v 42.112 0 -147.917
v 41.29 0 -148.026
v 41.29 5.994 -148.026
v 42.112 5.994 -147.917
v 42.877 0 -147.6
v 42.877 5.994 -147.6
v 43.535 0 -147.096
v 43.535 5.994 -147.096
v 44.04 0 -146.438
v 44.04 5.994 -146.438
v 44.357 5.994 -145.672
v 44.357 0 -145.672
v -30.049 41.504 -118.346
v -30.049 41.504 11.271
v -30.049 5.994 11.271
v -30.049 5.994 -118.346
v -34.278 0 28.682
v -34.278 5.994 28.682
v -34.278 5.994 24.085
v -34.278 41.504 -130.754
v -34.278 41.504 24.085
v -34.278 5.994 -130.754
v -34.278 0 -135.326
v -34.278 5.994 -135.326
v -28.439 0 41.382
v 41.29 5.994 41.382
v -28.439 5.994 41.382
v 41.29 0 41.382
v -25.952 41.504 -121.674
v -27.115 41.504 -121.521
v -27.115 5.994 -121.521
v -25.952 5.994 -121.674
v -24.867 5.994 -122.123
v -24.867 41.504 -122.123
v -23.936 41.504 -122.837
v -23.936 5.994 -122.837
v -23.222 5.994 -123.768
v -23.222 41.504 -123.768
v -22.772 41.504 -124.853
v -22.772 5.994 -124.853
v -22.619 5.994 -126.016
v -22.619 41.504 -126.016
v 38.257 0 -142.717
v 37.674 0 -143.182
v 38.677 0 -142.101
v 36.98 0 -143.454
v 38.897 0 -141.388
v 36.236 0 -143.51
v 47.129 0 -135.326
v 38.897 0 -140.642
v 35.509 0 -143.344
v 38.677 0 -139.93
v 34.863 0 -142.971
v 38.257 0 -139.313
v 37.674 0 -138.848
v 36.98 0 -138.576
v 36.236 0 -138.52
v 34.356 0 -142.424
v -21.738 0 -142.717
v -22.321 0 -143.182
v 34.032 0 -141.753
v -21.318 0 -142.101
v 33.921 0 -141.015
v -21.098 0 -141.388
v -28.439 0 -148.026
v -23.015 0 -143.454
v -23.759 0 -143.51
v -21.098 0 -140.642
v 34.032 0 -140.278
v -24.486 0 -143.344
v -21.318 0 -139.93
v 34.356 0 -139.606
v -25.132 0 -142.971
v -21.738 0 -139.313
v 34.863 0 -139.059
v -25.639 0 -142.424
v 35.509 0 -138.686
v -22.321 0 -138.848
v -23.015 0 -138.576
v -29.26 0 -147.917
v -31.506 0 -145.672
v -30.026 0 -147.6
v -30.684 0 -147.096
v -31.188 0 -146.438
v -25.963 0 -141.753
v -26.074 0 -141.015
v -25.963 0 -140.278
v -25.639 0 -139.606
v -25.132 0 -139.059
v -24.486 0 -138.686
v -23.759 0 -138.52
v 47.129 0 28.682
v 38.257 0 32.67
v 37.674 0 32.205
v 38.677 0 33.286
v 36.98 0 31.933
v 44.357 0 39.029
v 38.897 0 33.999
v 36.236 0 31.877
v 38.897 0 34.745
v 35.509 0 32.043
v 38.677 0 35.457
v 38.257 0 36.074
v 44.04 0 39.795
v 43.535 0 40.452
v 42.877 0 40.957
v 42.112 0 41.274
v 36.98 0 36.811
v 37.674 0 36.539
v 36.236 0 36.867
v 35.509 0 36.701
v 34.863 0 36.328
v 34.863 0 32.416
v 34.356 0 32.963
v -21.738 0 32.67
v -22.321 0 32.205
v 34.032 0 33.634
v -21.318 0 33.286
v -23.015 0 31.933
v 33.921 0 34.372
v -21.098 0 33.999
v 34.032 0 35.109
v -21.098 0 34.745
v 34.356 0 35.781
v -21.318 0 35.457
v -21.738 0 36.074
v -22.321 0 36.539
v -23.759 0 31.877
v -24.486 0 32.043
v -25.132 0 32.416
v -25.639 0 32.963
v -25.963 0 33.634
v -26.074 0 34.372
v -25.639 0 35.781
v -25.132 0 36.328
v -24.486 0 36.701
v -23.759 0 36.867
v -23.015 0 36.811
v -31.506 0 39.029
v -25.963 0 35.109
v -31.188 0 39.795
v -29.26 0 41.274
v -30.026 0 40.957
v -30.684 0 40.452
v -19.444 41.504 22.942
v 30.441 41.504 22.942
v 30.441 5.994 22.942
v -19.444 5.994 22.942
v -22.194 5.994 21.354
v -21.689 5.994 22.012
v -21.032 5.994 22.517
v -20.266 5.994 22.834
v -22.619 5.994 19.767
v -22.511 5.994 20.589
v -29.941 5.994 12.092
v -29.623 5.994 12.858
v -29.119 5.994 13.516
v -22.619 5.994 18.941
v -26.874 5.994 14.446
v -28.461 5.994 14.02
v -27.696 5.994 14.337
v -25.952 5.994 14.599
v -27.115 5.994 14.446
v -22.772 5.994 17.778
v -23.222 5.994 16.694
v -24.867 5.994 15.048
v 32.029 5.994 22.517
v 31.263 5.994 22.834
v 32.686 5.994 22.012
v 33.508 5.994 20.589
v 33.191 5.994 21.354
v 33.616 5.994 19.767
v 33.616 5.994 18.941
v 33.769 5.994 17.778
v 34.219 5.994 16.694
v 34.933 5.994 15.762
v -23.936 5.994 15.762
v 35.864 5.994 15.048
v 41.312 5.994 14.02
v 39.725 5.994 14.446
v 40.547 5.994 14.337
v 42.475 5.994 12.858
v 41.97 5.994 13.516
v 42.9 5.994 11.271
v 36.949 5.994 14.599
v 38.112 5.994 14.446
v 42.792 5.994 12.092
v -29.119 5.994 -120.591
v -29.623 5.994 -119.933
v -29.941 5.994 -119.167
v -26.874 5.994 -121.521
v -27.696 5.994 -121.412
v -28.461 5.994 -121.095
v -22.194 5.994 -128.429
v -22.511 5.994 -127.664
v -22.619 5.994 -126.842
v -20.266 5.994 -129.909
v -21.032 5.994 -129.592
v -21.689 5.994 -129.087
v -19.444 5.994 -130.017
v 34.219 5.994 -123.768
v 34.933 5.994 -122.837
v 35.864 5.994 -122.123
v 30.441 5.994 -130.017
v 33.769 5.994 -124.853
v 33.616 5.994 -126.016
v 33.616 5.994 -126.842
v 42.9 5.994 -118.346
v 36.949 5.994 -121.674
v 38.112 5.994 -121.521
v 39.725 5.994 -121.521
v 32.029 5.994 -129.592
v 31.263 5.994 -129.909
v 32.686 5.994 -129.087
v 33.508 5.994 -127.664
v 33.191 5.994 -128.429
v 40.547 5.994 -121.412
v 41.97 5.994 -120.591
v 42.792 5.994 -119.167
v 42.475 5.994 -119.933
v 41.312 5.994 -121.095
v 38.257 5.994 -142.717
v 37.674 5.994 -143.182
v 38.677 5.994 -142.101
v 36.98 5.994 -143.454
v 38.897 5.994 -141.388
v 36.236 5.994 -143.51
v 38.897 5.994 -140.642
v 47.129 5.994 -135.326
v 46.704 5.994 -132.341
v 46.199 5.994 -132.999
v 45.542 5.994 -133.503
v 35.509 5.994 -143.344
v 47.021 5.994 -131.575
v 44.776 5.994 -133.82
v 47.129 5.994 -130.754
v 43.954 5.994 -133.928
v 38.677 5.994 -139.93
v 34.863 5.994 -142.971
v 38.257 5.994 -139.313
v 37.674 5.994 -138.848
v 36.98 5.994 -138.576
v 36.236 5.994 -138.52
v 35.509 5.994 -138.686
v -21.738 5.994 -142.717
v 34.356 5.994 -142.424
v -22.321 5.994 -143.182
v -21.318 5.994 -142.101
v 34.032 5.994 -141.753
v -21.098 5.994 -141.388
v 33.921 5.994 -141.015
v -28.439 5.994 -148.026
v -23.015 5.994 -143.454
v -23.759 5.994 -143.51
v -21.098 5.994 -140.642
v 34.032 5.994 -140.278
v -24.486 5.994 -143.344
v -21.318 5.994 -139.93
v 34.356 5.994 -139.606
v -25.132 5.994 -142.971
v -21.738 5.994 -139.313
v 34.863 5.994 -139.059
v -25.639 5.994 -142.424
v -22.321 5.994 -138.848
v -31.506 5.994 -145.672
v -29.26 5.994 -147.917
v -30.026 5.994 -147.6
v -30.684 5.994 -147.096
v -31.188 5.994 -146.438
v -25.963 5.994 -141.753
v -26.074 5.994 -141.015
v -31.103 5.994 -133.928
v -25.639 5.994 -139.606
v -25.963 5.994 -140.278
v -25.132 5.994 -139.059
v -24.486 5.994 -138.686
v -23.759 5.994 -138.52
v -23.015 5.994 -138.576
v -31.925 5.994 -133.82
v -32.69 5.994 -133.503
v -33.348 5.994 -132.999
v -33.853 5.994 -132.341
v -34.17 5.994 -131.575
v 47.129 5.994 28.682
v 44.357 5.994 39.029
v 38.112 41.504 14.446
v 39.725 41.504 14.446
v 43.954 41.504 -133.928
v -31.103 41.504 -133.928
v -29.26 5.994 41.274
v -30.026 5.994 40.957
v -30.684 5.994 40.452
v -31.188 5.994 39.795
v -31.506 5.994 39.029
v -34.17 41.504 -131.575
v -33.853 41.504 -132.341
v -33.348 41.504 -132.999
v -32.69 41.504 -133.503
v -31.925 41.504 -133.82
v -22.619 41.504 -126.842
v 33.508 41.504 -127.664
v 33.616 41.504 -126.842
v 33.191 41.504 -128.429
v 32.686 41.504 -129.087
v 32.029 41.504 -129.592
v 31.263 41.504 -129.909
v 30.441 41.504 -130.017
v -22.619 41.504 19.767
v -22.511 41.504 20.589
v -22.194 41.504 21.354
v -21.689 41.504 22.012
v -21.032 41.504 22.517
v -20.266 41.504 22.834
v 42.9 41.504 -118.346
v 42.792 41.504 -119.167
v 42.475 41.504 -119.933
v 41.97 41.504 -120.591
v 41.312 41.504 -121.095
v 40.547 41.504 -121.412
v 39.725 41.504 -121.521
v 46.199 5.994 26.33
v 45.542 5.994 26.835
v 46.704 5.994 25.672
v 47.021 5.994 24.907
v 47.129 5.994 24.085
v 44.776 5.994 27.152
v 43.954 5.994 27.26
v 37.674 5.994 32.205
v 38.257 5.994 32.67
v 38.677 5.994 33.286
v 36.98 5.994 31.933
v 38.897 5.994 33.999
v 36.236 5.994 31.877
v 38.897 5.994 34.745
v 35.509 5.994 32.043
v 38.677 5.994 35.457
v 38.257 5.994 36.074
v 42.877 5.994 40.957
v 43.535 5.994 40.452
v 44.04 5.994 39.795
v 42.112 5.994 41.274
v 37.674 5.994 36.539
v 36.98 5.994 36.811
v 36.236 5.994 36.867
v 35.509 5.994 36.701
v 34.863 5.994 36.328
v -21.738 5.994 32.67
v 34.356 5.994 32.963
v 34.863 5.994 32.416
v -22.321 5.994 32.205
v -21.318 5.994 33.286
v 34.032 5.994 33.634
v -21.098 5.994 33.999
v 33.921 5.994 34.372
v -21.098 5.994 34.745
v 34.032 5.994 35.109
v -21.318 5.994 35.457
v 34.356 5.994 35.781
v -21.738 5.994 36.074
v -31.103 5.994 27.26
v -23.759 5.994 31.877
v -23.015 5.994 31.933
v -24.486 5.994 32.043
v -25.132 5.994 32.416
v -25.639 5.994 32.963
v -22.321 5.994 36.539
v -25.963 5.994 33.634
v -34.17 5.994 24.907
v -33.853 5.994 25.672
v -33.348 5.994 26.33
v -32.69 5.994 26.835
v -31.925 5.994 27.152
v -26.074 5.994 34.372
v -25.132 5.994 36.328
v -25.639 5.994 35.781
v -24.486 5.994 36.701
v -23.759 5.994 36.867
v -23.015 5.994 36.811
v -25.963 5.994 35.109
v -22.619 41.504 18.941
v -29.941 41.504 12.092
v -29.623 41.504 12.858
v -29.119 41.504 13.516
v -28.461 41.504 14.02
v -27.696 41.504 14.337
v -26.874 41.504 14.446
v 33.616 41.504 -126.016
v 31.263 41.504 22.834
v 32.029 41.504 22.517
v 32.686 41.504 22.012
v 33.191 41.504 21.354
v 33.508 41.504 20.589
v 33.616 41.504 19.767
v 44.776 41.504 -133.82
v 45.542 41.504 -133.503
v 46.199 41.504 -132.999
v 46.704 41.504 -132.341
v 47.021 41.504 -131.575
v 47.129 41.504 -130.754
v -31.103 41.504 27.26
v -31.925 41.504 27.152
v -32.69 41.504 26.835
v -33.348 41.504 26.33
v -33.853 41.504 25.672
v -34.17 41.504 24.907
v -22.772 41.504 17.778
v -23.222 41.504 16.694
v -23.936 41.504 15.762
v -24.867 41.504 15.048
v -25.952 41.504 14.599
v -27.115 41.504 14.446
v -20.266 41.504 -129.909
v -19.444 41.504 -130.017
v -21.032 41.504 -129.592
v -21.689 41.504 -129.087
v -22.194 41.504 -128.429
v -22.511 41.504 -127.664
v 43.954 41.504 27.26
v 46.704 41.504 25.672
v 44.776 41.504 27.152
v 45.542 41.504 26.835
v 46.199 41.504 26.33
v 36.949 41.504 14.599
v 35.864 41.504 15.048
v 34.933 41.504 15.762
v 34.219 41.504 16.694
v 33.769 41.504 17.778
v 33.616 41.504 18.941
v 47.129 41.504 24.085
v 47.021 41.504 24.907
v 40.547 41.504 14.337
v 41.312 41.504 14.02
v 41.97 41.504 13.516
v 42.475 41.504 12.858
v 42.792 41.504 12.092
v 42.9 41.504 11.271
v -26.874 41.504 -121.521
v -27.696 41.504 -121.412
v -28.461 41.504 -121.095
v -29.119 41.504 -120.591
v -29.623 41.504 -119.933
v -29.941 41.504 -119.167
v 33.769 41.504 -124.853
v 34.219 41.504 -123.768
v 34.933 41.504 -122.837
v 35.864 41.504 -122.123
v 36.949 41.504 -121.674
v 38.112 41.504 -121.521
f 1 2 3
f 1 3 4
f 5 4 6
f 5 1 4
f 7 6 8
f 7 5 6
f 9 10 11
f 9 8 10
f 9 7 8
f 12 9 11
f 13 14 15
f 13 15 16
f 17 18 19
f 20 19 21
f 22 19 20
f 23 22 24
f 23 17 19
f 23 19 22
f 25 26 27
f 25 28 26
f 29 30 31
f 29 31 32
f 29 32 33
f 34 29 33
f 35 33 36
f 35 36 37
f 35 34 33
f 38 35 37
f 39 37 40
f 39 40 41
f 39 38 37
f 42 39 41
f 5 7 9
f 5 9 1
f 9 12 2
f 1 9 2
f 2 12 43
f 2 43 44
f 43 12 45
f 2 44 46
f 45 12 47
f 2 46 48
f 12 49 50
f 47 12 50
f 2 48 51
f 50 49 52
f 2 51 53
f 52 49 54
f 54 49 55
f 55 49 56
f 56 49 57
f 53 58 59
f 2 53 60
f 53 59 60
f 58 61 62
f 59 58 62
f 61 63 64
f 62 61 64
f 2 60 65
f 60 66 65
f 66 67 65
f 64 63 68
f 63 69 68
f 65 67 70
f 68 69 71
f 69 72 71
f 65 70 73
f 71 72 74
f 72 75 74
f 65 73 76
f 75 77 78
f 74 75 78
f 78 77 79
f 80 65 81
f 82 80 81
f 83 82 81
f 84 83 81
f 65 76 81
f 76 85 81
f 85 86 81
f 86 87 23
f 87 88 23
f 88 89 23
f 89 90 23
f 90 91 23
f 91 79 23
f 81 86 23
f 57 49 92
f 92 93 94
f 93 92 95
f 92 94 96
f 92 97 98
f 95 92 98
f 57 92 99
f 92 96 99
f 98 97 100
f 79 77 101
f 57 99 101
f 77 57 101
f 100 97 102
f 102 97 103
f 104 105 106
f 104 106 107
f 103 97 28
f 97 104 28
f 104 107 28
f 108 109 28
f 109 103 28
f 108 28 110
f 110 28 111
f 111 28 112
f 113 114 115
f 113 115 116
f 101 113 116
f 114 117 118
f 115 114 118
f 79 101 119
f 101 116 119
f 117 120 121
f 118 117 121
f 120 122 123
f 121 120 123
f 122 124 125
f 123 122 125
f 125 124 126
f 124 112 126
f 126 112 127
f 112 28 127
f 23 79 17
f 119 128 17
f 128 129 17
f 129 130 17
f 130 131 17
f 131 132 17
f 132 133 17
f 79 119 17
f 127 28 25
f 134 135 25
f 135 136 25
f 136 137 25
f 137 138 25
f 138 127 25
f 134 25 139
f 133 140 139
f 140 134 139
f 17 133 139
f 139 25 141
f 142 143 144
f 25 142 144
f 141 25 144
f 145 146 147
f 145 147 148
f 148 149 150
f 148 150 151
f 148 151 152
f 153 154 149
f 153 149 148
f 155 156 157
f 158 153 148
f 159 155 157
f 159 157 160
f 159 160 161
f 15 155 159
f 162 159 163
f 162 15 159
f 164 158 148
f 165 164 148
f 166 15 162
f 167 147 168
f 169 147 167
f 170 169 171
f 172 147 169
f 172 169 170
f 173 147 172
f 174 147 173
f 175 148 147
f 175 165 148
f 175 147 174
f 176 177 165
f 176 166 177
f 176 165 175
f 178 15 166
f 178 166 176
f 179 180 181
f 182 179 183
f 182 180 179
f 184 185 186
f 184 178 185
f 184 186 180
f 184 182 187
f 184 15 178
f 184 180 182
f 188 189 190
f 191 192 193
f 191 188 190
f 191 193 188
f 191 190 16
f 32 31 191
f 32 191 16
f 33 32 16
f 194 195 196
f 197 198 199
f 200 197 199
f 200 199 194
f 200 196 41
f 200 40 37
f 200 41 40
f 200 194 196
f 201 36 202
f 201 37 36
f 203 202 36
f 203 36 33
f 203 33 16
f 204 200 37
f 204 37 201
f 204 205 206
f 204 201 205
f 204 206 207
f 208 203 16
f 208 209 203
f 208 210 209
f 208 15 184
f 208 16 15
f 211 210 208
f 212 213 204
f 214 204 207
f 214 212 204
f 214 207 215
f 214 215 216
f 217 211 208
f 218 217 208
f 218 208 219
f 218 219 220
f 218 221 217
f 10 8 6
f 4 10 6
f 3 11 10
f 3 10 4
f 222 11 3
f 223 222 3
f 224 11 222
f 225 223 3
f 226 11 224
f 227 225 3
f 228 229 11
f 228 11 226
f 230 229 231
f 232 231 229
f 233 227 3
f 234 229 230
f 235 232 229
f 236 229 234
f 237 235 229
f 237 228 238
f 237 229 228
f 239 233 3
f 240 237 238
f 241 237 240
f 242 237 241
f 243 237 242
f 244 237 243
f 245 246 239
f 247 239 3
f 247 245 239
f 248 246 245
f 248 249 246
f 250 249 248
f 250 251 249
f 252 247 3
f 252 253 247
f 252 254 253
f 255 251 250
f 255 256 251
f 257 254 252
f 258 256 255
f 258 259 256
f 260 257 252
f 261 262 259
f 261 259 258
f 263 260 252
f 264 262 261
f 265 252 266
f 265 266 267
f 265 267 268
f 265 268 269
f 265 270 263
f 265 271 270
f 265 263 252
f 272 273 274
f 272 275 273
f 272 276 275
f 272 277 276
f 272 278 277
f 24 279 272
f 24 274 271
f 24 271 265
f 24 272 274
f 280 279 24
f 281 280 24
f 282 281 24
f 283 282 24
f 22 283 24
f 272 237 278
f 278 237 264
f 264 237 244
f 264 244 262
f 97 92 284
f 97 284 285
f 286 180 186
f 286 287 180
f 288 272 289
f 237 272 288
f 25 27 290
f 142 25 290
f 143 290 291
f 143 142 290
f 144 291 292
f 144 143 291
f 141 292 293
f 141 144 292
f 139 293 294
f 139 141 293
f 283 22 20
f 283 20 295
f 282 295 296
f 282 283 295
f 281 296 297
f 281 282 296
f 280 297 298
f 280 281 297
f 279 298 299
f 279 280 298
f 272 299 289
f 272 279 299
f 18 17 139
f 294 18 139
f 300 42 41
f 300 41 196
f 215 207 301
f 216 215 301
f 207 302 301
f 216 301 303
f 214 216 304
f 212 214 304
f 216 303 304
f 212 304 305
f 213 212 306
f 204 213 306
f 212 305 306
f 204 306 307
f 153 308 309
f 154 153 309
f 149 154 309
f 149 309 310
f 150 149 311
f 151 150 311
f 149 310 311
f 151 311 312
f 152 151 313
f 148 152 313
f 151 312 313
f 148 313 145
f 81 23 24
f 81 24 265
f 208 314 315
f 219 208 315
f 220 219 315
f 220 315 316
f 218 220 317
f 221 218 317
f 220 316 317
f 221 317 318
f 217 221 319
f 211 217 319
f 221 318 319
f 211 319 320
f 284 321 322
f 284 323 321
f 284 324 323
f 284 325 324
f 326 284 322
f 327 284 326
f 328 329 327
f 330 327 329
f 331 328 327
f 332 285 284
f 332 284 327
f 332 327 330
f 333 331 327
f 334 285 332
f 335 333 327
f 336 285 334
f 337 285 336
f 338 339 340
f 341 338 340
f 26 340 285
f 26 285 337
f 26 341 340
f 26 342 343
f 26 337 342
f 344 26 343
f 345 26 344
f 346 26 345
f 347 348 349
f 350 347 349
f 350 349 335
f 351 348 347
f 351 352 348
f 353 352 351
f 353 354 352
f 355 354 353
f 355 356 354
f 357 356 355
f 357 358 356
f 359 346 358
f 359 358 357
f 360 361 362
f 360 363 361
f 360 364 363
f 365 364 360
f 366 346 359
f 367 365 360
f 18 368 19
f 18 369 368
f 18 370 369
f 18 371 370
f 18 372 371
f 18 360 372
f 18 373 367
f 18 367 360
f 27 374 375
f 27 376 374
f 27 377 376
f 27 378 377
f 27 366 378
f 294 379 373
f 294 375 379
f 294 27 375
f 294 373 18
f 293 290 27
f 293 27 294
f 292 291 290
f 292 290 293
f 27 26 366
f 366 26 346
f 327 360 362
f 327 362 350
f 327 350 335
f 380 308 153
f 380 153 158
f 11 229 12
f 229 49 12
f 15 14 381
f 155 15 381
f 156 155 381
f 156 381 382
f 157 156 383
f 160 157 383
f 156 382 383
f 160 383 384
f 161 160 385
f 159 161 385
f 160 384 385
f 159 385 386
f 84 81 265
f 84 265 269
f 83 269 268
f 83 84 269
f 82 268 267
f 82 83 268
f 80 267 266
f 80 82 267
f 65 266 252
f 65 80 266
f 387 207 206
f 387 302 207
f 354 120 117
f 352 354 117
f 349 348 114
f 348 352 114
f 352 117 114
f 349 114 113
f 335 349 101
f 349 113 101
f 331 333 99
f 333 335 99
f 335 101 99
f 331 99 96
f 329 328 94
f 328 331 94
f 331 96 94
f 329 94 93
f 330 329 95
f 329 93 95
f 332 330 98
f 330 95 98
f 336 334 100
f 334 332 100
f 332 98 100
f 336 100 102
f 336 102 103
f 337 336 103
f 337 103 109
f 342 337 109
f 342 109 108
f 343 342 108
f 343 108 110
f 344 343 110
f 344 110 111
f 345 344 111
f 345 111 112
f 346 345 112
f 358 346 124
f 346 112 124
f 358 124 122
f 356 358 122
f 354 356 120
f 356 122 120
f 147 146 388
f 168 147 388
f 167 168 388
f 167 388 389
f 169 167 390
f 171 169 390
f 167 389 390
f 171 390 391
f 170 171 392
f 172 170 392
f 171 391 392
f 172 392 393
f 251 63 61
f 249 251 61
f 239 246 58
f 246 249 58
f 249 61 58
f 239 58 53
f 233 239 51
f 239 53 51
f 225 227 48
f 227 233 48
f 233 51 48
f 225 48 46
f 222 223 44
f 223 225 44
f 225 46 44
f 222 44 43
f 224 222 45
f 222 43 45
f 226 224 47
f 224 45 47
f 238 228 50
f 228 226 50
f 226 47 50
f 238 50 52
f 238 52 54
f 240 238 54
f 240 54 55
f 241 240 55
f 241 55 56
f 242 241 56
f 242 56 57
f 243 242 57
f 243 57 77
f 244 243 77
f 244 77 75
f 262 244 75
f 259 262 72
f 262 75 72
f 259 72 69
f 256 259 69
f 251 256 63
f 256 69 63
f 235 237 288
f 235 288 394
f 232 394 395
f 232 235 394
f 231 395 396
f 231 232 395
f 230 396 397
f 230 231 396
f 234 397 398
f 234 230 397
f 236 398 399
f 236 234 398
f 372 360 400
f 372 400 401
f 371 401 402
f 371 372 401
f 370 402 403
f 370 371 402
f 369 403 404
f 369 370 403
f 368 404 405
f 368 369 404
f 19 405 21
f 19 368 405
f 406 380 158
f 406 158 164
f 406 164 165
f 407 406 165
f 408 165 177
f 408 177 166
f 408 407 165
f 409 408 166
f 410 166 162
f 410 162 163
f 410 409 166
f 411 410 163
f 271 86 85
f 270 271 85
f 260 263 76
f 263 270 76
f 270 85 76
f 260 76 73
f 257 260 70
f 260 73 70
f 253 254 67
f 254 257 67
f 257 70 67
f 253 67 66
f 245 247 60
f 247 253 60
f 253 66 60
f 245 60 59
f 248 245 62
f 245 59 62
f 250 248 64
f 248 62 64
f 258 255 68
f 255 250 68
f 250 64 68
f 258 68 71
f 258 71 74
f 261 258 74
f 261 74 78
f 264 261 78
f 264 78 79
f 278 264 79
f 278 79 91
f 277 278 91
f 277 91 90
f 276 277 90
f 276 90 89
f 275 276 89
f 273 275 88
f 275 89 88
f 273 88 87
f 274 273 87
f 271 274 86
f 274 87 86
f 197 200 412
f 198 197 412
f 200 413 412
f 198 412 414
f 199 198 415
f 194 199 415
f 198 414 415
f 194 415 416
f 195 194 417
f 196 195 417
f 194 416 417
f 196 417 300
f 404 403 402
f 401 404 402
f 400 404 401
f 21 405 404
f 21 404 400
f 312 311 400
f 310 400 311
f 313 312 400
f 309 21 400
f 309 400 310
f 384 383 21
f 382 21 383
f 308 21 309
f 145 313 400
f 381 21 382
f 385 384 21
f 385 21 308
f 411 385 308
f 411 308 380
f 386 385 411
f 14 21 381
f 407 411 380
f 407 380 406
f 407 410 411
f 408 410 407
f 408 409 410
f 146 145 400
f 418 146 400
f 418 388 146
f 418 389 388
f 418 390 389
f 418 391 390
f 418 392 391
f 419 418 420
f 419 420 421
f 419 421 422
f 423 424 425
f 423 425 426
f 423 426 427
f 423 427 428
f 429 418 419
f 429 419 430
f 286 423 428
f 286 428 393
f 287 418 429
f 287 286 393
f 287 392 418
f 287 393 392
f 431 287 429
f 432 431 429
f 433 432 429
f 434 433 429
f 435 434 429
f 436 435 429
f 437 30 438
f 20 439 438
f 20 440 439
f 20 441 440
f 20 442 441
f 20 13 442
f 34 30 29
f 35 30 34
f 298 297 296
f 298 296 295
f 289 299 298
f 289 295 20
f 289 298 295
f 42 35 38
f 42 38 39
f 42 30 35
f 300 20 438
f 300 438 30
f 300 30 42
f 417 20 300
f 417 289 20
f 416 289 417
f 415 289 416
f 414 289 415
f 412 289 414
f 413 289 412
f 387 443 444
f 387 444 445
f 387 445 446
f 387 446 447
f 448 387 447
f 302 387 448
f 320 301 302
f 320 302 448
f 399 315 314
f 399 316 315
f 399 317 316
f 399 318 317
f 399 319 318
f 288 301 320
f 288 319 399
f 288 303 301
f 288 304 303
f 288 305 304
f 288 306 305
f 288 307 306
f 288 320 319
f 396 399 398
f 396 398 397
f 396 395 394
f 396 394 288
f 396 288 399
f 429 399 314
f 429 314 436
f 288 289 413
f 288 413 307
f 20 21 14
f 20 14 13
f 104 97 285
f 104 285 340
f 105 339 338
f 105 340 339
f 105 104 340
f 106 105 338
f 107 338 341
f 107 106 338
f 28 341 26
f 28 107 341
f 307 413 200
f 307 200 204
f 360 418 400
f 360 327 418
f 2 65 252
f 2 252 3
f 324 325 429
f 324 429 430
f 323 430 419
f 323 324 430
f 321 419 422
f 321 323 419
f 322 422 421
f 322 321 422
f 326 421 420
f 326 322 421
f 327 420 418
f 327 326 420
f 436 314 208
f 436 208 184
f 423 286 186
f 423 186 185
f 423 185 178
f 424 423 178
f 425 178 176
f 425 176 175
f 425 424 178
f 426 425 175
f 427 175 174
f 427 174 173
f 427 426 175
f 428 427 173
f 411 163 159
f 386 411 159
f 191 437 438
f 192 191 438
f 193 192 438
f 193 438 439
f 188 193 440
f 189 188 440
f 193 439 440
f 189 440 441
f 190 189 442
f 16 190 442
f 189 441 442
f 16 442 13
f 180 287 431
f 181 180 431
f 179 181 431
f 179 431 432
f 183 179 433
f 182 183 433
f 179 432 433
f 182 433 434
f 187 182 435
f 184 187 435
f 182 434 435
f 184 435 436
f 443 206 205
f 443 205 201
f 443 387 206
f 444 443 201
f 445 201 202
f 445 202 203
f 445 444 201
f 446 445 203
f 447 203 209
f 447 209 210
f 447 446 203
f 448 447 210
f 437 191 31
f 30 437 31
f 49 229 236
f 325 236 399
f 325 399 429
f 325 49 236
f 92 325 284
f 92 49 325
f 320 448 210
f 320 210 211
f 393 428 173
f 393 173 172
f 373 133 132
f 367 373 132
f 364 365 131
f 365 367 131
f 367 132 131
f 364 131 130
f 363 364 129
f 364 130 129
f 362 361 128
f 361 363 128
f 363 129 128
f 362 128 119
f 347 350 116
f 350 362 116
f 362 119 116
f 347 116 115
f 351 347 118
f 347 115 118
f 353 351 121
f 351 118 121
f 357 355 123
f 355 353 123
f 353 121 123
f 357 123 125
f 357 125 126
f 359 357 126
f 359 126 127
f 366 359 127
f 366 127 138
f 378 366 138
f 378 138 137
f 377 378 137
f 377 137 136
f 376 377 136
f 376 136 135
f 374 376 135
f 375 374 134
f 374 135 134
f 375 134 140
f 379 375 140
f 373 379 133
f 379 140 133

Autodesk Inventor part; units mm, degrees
ref_plane "YZ Plane" through (0, 0, 0) normal (1, 0, 0) x (0, 1, 0)
ref_plane "XZ Plane" through (0, 0, 0) normal (0, 1, 0) x (-1, 0, 0)
ref_plane "XY Plane" through (0, 0, 0) normal (0, 0, 1) x (1, 0, 0)
sketch "Sketch1" plane through (0, 0, 0) normal (0, 1, 0) x (-1, 0, 0)
  line L0 (-41.2899, 41.3823) -> (28.4387, 41.3823)
  line L1 (34.2779, 28.6823) -> (34.2779, -135.3255)
  line L2 (28.4387, -148.0255) -> (-41.2899, -148.0255)
  line L3 (-47.1291, -135.3255) -> (-47.1291, 28.6823)
  line L4 (-47.1291, 28.6823) -> (34.2779, 28.6823)
  line L5 (-47.1291, -135.3255) -> (34.2779, -135.3255)
  line L6 (34.2779, -135.3255) -> (31.5055, -145.6722)
  line L7 (-47.1291, -135.3255) -> (-44.3567, -145.6722)
  line L8 (-47.1291, 28.6823) -> (-44.3567, 39.0291)
  line L9 (34.2779, 28.6823) -> (31.5055, 39.0291)
  arc A0 (-44.3567, -145.6722) -> (-41.2899, -148.0255) centre (-41.2899, -144.8505) ccw
  arc A1 (28.4387, -148.0255) -> (31.5055, -145.6722) centre (28.4387, -144.8505) ccw
  arc A2 (31.5055, 39.0291) -> (28.4387, 41.3823) centre (28.4387, 38.2073) ccw
  arc A3 (-41.2899, 41.3823) -> (-44.3567, 39.0291) centre (-41.2899, 38.2073) ccw
  circle A4 centre (-36.423, -141.0151) radius 2.5019
  circle A5 centre (23.5718, -141.0151) radius 2.5019
  circle A6 centre (-36.423, 34.3719) radius 2.5019
  circle A7 centre (23.5718, 34.3719) radius 2.5019
  line L10 (-6.4256, 41.3823) -> (-6.4256, -148.0255) construction
  point P0 (0, 0)
  dimension "d2" = 12.7
  dimension "d3" = 12.7
  dimension "d4" = 15
  dimension "d5" = 15
  dimension "d6" = 15
  dimension "d7" = 81.407
  dimension "d8" = 189.4078
  dimension "d9" = 3.175
  dimension "d10" = 7.0104
  dimension "d11" = 7.0104
  dimension "d12" = 7.0104
  dimension "d13" = 7.0104
  dimension "d14" = 59.9948
  dimension "d15" = 59.9948
  dimension "d16" = 5.0038
  dimension "d17" = 5.0038
  dimension "d18" = 5.0038
  dimension "d19" = 5.0038
  dimension "d20" = 29.9974
  dimension "d21" = 29.9974
extrude "Extrusion1" add sketch "Sketch1" along normal blind 5.9944
sketch "Sketch2" plane through (0, 5.9944, 0) normal (0, 1, 0) x (1, 0, 0)
  line L0 (47.1291, -28.6823) -> (47.1291, 135.3255) projected
  line L1 (41.2899, 148.0255) -> (-28.4387, 148.0255) projected
  line L2 (-34.2779, 135.3255) -> (-34.2779, -28.6823) projected
  line L3 (-31.1029, 133.9285) -> (43.9541, 133.9285)
  line L4 (47.1291, 130.7535) -> (47.1291, -24.0849)
  line L5 (43.9541, -27.2599) -> (-31.1029, -27.2599)
  line L6 (-34.2779, -24.0849) -> (-34.2779, 130.7535)
  arc A0 (-34.2779, -24.0849) -> (-31.1029, -27.2599) centre (-31.1029, -24.0849) ccw
  arc A1 (43.9541, -27.2599) -> (47.1291, -24.0849) centre (43.9541, -24.0849) ccw
  arc A2 (47.1291, 130.7535) -> (43.9541, 133.9285) centre (43.9541, 130.7535) ccw
  arc A3 (-31.1029, 133.9285) -> (-34.2779, 130.7535) centre (-31.1029, 130.7535) ccw
  point P0 (0, 0)
  point P1 (-34.2779, 133.9285)
  point P2 (47.1291, -27.2599)
  dimension "d25" = 161.1884
  dimension "d26" = 14.097
  dimension "d27" = 3.175
extrude "Extrusion2" add sketch "Sketch2" along normal blind 35.5092
sketch "Sketch3" plane through (0, 41.5036, 0) normal (0, 1, 0) x (1, 0, 0)
  line L0 (-34.2779, 130.7535) -> (-34.2779, -24.0849) projected
  line L1 (43.9541, 133.9285) -> (-31.1029, 133.9285) projected
  line L2 (42.9, 118.3456) -> (42.9, -11.2706)
  line L3 (-30.0488, -11.2706) -> (-30.0488, 118.3456)
  line L4 (-19.4443, 130.0169) -> (30.4413, 130.0169)
  line L5 (30.4413, -22.9419) -> (-19.4443, -22.9419)
  arc A0 (33.6163, 126.8419) -> (30.4413, 130.0169) centre (30.4413, 126.8419) ccw
  arc A1 (-19.4443, 130.0169) -> (-22.6193, 126.8419) centre (-19.4443, 126.8419) ccw
  arc A2 (-22.6193, -19.7669) -> (-19.4443, -22.9419) centre (-19.4443, -19.7669) ccw
  arc A3 (30.4413, -22.9419) -> (33.6163, -19.7669) centre (30.4413, -19.7669) ccw
  arc A4 (-30.0488, -11.2706) -> (-26.8738, -14.4456) centre (-26.8738, -11.2706) ccw
  arc A5 (-26.8738, 121.5206) -> (-30.0488, 118.3456) centre (-26.8738, 118.3456) ccw
  arc A6 (42.9, 118.3456) -> (39.725, 121.5206) centre (39.725, 118.3456) ccw
  arc A7 (39.725, -14.4456) -> (42.9, -11.2706) centre (39.725, -11.2706) ccw
  line L6 (33.6163, 126.8419) -> (33.6163, 126.0164)
  line L7 (33.6163, -18.9414) -> (33.6163, -19.7669)
  line L8 (-22.6193, -19.7669) -> (-22.6193, -18.9414)
  line L9 (-22.6193, 126.0164) -> (-22.6193, 126.8419)
  line L10 (39.725, -14.4456) -> (38.1121, -14.4456)
  line L11 (-27.1151, -14.4456) -> (-26.8738, -14.4456)
  line L12 (-26.8738, 121.5206) -> (-27.1151, 121.5206)
  line L13 (38.1121, 121.5206) -> (39.725, 121.5206)
  arc A8 (38.1121, -14.4456) -> (33.6163, -18.9414) centre (38.1121, -18.9414) ccw
  arc A9 (33.6163, 126.0164) -> (38.1121, 121.5206) centre (38.1121, 126.0164) ccw
  arc A10 (-27.1151, 121.5206) -> (-22.6193, 126.0164) centre (-27.1151, 126.0164) ccw
  arc A11 (-22.6193, -18.9414) -> (-27.1151, -14.4456) centre (-27.1151, -18.9414) ccw
  point P0 (0, 0)
  point P1 (42.9, 76.4991)
  point P2 (42.9, 110.1795)
  point P3 (-30.0488, 76.4991)
  point P4 (-22.7463, 130.0169)
  point P5 (33.6163, -22.9419)
  point P6 (33.6163, 130.0169)
  dimension "d30" = 56.3626
  dimension "d32" = 152.9588
  dimension "d35" = 72.9488
  dimension "d36" = 4.2291
  dimension "d37" = 3.9116
  dimension "d38" = 3.175
  dimension "d39" = 4.4958
  dimension "d42" = 135.9662
  dimension "d43" = 8.4963
extrude "Extrusion3" cut sketch "Sketch3" against normal blind 35.5092
properties part number "NEAMBoxLarge"
